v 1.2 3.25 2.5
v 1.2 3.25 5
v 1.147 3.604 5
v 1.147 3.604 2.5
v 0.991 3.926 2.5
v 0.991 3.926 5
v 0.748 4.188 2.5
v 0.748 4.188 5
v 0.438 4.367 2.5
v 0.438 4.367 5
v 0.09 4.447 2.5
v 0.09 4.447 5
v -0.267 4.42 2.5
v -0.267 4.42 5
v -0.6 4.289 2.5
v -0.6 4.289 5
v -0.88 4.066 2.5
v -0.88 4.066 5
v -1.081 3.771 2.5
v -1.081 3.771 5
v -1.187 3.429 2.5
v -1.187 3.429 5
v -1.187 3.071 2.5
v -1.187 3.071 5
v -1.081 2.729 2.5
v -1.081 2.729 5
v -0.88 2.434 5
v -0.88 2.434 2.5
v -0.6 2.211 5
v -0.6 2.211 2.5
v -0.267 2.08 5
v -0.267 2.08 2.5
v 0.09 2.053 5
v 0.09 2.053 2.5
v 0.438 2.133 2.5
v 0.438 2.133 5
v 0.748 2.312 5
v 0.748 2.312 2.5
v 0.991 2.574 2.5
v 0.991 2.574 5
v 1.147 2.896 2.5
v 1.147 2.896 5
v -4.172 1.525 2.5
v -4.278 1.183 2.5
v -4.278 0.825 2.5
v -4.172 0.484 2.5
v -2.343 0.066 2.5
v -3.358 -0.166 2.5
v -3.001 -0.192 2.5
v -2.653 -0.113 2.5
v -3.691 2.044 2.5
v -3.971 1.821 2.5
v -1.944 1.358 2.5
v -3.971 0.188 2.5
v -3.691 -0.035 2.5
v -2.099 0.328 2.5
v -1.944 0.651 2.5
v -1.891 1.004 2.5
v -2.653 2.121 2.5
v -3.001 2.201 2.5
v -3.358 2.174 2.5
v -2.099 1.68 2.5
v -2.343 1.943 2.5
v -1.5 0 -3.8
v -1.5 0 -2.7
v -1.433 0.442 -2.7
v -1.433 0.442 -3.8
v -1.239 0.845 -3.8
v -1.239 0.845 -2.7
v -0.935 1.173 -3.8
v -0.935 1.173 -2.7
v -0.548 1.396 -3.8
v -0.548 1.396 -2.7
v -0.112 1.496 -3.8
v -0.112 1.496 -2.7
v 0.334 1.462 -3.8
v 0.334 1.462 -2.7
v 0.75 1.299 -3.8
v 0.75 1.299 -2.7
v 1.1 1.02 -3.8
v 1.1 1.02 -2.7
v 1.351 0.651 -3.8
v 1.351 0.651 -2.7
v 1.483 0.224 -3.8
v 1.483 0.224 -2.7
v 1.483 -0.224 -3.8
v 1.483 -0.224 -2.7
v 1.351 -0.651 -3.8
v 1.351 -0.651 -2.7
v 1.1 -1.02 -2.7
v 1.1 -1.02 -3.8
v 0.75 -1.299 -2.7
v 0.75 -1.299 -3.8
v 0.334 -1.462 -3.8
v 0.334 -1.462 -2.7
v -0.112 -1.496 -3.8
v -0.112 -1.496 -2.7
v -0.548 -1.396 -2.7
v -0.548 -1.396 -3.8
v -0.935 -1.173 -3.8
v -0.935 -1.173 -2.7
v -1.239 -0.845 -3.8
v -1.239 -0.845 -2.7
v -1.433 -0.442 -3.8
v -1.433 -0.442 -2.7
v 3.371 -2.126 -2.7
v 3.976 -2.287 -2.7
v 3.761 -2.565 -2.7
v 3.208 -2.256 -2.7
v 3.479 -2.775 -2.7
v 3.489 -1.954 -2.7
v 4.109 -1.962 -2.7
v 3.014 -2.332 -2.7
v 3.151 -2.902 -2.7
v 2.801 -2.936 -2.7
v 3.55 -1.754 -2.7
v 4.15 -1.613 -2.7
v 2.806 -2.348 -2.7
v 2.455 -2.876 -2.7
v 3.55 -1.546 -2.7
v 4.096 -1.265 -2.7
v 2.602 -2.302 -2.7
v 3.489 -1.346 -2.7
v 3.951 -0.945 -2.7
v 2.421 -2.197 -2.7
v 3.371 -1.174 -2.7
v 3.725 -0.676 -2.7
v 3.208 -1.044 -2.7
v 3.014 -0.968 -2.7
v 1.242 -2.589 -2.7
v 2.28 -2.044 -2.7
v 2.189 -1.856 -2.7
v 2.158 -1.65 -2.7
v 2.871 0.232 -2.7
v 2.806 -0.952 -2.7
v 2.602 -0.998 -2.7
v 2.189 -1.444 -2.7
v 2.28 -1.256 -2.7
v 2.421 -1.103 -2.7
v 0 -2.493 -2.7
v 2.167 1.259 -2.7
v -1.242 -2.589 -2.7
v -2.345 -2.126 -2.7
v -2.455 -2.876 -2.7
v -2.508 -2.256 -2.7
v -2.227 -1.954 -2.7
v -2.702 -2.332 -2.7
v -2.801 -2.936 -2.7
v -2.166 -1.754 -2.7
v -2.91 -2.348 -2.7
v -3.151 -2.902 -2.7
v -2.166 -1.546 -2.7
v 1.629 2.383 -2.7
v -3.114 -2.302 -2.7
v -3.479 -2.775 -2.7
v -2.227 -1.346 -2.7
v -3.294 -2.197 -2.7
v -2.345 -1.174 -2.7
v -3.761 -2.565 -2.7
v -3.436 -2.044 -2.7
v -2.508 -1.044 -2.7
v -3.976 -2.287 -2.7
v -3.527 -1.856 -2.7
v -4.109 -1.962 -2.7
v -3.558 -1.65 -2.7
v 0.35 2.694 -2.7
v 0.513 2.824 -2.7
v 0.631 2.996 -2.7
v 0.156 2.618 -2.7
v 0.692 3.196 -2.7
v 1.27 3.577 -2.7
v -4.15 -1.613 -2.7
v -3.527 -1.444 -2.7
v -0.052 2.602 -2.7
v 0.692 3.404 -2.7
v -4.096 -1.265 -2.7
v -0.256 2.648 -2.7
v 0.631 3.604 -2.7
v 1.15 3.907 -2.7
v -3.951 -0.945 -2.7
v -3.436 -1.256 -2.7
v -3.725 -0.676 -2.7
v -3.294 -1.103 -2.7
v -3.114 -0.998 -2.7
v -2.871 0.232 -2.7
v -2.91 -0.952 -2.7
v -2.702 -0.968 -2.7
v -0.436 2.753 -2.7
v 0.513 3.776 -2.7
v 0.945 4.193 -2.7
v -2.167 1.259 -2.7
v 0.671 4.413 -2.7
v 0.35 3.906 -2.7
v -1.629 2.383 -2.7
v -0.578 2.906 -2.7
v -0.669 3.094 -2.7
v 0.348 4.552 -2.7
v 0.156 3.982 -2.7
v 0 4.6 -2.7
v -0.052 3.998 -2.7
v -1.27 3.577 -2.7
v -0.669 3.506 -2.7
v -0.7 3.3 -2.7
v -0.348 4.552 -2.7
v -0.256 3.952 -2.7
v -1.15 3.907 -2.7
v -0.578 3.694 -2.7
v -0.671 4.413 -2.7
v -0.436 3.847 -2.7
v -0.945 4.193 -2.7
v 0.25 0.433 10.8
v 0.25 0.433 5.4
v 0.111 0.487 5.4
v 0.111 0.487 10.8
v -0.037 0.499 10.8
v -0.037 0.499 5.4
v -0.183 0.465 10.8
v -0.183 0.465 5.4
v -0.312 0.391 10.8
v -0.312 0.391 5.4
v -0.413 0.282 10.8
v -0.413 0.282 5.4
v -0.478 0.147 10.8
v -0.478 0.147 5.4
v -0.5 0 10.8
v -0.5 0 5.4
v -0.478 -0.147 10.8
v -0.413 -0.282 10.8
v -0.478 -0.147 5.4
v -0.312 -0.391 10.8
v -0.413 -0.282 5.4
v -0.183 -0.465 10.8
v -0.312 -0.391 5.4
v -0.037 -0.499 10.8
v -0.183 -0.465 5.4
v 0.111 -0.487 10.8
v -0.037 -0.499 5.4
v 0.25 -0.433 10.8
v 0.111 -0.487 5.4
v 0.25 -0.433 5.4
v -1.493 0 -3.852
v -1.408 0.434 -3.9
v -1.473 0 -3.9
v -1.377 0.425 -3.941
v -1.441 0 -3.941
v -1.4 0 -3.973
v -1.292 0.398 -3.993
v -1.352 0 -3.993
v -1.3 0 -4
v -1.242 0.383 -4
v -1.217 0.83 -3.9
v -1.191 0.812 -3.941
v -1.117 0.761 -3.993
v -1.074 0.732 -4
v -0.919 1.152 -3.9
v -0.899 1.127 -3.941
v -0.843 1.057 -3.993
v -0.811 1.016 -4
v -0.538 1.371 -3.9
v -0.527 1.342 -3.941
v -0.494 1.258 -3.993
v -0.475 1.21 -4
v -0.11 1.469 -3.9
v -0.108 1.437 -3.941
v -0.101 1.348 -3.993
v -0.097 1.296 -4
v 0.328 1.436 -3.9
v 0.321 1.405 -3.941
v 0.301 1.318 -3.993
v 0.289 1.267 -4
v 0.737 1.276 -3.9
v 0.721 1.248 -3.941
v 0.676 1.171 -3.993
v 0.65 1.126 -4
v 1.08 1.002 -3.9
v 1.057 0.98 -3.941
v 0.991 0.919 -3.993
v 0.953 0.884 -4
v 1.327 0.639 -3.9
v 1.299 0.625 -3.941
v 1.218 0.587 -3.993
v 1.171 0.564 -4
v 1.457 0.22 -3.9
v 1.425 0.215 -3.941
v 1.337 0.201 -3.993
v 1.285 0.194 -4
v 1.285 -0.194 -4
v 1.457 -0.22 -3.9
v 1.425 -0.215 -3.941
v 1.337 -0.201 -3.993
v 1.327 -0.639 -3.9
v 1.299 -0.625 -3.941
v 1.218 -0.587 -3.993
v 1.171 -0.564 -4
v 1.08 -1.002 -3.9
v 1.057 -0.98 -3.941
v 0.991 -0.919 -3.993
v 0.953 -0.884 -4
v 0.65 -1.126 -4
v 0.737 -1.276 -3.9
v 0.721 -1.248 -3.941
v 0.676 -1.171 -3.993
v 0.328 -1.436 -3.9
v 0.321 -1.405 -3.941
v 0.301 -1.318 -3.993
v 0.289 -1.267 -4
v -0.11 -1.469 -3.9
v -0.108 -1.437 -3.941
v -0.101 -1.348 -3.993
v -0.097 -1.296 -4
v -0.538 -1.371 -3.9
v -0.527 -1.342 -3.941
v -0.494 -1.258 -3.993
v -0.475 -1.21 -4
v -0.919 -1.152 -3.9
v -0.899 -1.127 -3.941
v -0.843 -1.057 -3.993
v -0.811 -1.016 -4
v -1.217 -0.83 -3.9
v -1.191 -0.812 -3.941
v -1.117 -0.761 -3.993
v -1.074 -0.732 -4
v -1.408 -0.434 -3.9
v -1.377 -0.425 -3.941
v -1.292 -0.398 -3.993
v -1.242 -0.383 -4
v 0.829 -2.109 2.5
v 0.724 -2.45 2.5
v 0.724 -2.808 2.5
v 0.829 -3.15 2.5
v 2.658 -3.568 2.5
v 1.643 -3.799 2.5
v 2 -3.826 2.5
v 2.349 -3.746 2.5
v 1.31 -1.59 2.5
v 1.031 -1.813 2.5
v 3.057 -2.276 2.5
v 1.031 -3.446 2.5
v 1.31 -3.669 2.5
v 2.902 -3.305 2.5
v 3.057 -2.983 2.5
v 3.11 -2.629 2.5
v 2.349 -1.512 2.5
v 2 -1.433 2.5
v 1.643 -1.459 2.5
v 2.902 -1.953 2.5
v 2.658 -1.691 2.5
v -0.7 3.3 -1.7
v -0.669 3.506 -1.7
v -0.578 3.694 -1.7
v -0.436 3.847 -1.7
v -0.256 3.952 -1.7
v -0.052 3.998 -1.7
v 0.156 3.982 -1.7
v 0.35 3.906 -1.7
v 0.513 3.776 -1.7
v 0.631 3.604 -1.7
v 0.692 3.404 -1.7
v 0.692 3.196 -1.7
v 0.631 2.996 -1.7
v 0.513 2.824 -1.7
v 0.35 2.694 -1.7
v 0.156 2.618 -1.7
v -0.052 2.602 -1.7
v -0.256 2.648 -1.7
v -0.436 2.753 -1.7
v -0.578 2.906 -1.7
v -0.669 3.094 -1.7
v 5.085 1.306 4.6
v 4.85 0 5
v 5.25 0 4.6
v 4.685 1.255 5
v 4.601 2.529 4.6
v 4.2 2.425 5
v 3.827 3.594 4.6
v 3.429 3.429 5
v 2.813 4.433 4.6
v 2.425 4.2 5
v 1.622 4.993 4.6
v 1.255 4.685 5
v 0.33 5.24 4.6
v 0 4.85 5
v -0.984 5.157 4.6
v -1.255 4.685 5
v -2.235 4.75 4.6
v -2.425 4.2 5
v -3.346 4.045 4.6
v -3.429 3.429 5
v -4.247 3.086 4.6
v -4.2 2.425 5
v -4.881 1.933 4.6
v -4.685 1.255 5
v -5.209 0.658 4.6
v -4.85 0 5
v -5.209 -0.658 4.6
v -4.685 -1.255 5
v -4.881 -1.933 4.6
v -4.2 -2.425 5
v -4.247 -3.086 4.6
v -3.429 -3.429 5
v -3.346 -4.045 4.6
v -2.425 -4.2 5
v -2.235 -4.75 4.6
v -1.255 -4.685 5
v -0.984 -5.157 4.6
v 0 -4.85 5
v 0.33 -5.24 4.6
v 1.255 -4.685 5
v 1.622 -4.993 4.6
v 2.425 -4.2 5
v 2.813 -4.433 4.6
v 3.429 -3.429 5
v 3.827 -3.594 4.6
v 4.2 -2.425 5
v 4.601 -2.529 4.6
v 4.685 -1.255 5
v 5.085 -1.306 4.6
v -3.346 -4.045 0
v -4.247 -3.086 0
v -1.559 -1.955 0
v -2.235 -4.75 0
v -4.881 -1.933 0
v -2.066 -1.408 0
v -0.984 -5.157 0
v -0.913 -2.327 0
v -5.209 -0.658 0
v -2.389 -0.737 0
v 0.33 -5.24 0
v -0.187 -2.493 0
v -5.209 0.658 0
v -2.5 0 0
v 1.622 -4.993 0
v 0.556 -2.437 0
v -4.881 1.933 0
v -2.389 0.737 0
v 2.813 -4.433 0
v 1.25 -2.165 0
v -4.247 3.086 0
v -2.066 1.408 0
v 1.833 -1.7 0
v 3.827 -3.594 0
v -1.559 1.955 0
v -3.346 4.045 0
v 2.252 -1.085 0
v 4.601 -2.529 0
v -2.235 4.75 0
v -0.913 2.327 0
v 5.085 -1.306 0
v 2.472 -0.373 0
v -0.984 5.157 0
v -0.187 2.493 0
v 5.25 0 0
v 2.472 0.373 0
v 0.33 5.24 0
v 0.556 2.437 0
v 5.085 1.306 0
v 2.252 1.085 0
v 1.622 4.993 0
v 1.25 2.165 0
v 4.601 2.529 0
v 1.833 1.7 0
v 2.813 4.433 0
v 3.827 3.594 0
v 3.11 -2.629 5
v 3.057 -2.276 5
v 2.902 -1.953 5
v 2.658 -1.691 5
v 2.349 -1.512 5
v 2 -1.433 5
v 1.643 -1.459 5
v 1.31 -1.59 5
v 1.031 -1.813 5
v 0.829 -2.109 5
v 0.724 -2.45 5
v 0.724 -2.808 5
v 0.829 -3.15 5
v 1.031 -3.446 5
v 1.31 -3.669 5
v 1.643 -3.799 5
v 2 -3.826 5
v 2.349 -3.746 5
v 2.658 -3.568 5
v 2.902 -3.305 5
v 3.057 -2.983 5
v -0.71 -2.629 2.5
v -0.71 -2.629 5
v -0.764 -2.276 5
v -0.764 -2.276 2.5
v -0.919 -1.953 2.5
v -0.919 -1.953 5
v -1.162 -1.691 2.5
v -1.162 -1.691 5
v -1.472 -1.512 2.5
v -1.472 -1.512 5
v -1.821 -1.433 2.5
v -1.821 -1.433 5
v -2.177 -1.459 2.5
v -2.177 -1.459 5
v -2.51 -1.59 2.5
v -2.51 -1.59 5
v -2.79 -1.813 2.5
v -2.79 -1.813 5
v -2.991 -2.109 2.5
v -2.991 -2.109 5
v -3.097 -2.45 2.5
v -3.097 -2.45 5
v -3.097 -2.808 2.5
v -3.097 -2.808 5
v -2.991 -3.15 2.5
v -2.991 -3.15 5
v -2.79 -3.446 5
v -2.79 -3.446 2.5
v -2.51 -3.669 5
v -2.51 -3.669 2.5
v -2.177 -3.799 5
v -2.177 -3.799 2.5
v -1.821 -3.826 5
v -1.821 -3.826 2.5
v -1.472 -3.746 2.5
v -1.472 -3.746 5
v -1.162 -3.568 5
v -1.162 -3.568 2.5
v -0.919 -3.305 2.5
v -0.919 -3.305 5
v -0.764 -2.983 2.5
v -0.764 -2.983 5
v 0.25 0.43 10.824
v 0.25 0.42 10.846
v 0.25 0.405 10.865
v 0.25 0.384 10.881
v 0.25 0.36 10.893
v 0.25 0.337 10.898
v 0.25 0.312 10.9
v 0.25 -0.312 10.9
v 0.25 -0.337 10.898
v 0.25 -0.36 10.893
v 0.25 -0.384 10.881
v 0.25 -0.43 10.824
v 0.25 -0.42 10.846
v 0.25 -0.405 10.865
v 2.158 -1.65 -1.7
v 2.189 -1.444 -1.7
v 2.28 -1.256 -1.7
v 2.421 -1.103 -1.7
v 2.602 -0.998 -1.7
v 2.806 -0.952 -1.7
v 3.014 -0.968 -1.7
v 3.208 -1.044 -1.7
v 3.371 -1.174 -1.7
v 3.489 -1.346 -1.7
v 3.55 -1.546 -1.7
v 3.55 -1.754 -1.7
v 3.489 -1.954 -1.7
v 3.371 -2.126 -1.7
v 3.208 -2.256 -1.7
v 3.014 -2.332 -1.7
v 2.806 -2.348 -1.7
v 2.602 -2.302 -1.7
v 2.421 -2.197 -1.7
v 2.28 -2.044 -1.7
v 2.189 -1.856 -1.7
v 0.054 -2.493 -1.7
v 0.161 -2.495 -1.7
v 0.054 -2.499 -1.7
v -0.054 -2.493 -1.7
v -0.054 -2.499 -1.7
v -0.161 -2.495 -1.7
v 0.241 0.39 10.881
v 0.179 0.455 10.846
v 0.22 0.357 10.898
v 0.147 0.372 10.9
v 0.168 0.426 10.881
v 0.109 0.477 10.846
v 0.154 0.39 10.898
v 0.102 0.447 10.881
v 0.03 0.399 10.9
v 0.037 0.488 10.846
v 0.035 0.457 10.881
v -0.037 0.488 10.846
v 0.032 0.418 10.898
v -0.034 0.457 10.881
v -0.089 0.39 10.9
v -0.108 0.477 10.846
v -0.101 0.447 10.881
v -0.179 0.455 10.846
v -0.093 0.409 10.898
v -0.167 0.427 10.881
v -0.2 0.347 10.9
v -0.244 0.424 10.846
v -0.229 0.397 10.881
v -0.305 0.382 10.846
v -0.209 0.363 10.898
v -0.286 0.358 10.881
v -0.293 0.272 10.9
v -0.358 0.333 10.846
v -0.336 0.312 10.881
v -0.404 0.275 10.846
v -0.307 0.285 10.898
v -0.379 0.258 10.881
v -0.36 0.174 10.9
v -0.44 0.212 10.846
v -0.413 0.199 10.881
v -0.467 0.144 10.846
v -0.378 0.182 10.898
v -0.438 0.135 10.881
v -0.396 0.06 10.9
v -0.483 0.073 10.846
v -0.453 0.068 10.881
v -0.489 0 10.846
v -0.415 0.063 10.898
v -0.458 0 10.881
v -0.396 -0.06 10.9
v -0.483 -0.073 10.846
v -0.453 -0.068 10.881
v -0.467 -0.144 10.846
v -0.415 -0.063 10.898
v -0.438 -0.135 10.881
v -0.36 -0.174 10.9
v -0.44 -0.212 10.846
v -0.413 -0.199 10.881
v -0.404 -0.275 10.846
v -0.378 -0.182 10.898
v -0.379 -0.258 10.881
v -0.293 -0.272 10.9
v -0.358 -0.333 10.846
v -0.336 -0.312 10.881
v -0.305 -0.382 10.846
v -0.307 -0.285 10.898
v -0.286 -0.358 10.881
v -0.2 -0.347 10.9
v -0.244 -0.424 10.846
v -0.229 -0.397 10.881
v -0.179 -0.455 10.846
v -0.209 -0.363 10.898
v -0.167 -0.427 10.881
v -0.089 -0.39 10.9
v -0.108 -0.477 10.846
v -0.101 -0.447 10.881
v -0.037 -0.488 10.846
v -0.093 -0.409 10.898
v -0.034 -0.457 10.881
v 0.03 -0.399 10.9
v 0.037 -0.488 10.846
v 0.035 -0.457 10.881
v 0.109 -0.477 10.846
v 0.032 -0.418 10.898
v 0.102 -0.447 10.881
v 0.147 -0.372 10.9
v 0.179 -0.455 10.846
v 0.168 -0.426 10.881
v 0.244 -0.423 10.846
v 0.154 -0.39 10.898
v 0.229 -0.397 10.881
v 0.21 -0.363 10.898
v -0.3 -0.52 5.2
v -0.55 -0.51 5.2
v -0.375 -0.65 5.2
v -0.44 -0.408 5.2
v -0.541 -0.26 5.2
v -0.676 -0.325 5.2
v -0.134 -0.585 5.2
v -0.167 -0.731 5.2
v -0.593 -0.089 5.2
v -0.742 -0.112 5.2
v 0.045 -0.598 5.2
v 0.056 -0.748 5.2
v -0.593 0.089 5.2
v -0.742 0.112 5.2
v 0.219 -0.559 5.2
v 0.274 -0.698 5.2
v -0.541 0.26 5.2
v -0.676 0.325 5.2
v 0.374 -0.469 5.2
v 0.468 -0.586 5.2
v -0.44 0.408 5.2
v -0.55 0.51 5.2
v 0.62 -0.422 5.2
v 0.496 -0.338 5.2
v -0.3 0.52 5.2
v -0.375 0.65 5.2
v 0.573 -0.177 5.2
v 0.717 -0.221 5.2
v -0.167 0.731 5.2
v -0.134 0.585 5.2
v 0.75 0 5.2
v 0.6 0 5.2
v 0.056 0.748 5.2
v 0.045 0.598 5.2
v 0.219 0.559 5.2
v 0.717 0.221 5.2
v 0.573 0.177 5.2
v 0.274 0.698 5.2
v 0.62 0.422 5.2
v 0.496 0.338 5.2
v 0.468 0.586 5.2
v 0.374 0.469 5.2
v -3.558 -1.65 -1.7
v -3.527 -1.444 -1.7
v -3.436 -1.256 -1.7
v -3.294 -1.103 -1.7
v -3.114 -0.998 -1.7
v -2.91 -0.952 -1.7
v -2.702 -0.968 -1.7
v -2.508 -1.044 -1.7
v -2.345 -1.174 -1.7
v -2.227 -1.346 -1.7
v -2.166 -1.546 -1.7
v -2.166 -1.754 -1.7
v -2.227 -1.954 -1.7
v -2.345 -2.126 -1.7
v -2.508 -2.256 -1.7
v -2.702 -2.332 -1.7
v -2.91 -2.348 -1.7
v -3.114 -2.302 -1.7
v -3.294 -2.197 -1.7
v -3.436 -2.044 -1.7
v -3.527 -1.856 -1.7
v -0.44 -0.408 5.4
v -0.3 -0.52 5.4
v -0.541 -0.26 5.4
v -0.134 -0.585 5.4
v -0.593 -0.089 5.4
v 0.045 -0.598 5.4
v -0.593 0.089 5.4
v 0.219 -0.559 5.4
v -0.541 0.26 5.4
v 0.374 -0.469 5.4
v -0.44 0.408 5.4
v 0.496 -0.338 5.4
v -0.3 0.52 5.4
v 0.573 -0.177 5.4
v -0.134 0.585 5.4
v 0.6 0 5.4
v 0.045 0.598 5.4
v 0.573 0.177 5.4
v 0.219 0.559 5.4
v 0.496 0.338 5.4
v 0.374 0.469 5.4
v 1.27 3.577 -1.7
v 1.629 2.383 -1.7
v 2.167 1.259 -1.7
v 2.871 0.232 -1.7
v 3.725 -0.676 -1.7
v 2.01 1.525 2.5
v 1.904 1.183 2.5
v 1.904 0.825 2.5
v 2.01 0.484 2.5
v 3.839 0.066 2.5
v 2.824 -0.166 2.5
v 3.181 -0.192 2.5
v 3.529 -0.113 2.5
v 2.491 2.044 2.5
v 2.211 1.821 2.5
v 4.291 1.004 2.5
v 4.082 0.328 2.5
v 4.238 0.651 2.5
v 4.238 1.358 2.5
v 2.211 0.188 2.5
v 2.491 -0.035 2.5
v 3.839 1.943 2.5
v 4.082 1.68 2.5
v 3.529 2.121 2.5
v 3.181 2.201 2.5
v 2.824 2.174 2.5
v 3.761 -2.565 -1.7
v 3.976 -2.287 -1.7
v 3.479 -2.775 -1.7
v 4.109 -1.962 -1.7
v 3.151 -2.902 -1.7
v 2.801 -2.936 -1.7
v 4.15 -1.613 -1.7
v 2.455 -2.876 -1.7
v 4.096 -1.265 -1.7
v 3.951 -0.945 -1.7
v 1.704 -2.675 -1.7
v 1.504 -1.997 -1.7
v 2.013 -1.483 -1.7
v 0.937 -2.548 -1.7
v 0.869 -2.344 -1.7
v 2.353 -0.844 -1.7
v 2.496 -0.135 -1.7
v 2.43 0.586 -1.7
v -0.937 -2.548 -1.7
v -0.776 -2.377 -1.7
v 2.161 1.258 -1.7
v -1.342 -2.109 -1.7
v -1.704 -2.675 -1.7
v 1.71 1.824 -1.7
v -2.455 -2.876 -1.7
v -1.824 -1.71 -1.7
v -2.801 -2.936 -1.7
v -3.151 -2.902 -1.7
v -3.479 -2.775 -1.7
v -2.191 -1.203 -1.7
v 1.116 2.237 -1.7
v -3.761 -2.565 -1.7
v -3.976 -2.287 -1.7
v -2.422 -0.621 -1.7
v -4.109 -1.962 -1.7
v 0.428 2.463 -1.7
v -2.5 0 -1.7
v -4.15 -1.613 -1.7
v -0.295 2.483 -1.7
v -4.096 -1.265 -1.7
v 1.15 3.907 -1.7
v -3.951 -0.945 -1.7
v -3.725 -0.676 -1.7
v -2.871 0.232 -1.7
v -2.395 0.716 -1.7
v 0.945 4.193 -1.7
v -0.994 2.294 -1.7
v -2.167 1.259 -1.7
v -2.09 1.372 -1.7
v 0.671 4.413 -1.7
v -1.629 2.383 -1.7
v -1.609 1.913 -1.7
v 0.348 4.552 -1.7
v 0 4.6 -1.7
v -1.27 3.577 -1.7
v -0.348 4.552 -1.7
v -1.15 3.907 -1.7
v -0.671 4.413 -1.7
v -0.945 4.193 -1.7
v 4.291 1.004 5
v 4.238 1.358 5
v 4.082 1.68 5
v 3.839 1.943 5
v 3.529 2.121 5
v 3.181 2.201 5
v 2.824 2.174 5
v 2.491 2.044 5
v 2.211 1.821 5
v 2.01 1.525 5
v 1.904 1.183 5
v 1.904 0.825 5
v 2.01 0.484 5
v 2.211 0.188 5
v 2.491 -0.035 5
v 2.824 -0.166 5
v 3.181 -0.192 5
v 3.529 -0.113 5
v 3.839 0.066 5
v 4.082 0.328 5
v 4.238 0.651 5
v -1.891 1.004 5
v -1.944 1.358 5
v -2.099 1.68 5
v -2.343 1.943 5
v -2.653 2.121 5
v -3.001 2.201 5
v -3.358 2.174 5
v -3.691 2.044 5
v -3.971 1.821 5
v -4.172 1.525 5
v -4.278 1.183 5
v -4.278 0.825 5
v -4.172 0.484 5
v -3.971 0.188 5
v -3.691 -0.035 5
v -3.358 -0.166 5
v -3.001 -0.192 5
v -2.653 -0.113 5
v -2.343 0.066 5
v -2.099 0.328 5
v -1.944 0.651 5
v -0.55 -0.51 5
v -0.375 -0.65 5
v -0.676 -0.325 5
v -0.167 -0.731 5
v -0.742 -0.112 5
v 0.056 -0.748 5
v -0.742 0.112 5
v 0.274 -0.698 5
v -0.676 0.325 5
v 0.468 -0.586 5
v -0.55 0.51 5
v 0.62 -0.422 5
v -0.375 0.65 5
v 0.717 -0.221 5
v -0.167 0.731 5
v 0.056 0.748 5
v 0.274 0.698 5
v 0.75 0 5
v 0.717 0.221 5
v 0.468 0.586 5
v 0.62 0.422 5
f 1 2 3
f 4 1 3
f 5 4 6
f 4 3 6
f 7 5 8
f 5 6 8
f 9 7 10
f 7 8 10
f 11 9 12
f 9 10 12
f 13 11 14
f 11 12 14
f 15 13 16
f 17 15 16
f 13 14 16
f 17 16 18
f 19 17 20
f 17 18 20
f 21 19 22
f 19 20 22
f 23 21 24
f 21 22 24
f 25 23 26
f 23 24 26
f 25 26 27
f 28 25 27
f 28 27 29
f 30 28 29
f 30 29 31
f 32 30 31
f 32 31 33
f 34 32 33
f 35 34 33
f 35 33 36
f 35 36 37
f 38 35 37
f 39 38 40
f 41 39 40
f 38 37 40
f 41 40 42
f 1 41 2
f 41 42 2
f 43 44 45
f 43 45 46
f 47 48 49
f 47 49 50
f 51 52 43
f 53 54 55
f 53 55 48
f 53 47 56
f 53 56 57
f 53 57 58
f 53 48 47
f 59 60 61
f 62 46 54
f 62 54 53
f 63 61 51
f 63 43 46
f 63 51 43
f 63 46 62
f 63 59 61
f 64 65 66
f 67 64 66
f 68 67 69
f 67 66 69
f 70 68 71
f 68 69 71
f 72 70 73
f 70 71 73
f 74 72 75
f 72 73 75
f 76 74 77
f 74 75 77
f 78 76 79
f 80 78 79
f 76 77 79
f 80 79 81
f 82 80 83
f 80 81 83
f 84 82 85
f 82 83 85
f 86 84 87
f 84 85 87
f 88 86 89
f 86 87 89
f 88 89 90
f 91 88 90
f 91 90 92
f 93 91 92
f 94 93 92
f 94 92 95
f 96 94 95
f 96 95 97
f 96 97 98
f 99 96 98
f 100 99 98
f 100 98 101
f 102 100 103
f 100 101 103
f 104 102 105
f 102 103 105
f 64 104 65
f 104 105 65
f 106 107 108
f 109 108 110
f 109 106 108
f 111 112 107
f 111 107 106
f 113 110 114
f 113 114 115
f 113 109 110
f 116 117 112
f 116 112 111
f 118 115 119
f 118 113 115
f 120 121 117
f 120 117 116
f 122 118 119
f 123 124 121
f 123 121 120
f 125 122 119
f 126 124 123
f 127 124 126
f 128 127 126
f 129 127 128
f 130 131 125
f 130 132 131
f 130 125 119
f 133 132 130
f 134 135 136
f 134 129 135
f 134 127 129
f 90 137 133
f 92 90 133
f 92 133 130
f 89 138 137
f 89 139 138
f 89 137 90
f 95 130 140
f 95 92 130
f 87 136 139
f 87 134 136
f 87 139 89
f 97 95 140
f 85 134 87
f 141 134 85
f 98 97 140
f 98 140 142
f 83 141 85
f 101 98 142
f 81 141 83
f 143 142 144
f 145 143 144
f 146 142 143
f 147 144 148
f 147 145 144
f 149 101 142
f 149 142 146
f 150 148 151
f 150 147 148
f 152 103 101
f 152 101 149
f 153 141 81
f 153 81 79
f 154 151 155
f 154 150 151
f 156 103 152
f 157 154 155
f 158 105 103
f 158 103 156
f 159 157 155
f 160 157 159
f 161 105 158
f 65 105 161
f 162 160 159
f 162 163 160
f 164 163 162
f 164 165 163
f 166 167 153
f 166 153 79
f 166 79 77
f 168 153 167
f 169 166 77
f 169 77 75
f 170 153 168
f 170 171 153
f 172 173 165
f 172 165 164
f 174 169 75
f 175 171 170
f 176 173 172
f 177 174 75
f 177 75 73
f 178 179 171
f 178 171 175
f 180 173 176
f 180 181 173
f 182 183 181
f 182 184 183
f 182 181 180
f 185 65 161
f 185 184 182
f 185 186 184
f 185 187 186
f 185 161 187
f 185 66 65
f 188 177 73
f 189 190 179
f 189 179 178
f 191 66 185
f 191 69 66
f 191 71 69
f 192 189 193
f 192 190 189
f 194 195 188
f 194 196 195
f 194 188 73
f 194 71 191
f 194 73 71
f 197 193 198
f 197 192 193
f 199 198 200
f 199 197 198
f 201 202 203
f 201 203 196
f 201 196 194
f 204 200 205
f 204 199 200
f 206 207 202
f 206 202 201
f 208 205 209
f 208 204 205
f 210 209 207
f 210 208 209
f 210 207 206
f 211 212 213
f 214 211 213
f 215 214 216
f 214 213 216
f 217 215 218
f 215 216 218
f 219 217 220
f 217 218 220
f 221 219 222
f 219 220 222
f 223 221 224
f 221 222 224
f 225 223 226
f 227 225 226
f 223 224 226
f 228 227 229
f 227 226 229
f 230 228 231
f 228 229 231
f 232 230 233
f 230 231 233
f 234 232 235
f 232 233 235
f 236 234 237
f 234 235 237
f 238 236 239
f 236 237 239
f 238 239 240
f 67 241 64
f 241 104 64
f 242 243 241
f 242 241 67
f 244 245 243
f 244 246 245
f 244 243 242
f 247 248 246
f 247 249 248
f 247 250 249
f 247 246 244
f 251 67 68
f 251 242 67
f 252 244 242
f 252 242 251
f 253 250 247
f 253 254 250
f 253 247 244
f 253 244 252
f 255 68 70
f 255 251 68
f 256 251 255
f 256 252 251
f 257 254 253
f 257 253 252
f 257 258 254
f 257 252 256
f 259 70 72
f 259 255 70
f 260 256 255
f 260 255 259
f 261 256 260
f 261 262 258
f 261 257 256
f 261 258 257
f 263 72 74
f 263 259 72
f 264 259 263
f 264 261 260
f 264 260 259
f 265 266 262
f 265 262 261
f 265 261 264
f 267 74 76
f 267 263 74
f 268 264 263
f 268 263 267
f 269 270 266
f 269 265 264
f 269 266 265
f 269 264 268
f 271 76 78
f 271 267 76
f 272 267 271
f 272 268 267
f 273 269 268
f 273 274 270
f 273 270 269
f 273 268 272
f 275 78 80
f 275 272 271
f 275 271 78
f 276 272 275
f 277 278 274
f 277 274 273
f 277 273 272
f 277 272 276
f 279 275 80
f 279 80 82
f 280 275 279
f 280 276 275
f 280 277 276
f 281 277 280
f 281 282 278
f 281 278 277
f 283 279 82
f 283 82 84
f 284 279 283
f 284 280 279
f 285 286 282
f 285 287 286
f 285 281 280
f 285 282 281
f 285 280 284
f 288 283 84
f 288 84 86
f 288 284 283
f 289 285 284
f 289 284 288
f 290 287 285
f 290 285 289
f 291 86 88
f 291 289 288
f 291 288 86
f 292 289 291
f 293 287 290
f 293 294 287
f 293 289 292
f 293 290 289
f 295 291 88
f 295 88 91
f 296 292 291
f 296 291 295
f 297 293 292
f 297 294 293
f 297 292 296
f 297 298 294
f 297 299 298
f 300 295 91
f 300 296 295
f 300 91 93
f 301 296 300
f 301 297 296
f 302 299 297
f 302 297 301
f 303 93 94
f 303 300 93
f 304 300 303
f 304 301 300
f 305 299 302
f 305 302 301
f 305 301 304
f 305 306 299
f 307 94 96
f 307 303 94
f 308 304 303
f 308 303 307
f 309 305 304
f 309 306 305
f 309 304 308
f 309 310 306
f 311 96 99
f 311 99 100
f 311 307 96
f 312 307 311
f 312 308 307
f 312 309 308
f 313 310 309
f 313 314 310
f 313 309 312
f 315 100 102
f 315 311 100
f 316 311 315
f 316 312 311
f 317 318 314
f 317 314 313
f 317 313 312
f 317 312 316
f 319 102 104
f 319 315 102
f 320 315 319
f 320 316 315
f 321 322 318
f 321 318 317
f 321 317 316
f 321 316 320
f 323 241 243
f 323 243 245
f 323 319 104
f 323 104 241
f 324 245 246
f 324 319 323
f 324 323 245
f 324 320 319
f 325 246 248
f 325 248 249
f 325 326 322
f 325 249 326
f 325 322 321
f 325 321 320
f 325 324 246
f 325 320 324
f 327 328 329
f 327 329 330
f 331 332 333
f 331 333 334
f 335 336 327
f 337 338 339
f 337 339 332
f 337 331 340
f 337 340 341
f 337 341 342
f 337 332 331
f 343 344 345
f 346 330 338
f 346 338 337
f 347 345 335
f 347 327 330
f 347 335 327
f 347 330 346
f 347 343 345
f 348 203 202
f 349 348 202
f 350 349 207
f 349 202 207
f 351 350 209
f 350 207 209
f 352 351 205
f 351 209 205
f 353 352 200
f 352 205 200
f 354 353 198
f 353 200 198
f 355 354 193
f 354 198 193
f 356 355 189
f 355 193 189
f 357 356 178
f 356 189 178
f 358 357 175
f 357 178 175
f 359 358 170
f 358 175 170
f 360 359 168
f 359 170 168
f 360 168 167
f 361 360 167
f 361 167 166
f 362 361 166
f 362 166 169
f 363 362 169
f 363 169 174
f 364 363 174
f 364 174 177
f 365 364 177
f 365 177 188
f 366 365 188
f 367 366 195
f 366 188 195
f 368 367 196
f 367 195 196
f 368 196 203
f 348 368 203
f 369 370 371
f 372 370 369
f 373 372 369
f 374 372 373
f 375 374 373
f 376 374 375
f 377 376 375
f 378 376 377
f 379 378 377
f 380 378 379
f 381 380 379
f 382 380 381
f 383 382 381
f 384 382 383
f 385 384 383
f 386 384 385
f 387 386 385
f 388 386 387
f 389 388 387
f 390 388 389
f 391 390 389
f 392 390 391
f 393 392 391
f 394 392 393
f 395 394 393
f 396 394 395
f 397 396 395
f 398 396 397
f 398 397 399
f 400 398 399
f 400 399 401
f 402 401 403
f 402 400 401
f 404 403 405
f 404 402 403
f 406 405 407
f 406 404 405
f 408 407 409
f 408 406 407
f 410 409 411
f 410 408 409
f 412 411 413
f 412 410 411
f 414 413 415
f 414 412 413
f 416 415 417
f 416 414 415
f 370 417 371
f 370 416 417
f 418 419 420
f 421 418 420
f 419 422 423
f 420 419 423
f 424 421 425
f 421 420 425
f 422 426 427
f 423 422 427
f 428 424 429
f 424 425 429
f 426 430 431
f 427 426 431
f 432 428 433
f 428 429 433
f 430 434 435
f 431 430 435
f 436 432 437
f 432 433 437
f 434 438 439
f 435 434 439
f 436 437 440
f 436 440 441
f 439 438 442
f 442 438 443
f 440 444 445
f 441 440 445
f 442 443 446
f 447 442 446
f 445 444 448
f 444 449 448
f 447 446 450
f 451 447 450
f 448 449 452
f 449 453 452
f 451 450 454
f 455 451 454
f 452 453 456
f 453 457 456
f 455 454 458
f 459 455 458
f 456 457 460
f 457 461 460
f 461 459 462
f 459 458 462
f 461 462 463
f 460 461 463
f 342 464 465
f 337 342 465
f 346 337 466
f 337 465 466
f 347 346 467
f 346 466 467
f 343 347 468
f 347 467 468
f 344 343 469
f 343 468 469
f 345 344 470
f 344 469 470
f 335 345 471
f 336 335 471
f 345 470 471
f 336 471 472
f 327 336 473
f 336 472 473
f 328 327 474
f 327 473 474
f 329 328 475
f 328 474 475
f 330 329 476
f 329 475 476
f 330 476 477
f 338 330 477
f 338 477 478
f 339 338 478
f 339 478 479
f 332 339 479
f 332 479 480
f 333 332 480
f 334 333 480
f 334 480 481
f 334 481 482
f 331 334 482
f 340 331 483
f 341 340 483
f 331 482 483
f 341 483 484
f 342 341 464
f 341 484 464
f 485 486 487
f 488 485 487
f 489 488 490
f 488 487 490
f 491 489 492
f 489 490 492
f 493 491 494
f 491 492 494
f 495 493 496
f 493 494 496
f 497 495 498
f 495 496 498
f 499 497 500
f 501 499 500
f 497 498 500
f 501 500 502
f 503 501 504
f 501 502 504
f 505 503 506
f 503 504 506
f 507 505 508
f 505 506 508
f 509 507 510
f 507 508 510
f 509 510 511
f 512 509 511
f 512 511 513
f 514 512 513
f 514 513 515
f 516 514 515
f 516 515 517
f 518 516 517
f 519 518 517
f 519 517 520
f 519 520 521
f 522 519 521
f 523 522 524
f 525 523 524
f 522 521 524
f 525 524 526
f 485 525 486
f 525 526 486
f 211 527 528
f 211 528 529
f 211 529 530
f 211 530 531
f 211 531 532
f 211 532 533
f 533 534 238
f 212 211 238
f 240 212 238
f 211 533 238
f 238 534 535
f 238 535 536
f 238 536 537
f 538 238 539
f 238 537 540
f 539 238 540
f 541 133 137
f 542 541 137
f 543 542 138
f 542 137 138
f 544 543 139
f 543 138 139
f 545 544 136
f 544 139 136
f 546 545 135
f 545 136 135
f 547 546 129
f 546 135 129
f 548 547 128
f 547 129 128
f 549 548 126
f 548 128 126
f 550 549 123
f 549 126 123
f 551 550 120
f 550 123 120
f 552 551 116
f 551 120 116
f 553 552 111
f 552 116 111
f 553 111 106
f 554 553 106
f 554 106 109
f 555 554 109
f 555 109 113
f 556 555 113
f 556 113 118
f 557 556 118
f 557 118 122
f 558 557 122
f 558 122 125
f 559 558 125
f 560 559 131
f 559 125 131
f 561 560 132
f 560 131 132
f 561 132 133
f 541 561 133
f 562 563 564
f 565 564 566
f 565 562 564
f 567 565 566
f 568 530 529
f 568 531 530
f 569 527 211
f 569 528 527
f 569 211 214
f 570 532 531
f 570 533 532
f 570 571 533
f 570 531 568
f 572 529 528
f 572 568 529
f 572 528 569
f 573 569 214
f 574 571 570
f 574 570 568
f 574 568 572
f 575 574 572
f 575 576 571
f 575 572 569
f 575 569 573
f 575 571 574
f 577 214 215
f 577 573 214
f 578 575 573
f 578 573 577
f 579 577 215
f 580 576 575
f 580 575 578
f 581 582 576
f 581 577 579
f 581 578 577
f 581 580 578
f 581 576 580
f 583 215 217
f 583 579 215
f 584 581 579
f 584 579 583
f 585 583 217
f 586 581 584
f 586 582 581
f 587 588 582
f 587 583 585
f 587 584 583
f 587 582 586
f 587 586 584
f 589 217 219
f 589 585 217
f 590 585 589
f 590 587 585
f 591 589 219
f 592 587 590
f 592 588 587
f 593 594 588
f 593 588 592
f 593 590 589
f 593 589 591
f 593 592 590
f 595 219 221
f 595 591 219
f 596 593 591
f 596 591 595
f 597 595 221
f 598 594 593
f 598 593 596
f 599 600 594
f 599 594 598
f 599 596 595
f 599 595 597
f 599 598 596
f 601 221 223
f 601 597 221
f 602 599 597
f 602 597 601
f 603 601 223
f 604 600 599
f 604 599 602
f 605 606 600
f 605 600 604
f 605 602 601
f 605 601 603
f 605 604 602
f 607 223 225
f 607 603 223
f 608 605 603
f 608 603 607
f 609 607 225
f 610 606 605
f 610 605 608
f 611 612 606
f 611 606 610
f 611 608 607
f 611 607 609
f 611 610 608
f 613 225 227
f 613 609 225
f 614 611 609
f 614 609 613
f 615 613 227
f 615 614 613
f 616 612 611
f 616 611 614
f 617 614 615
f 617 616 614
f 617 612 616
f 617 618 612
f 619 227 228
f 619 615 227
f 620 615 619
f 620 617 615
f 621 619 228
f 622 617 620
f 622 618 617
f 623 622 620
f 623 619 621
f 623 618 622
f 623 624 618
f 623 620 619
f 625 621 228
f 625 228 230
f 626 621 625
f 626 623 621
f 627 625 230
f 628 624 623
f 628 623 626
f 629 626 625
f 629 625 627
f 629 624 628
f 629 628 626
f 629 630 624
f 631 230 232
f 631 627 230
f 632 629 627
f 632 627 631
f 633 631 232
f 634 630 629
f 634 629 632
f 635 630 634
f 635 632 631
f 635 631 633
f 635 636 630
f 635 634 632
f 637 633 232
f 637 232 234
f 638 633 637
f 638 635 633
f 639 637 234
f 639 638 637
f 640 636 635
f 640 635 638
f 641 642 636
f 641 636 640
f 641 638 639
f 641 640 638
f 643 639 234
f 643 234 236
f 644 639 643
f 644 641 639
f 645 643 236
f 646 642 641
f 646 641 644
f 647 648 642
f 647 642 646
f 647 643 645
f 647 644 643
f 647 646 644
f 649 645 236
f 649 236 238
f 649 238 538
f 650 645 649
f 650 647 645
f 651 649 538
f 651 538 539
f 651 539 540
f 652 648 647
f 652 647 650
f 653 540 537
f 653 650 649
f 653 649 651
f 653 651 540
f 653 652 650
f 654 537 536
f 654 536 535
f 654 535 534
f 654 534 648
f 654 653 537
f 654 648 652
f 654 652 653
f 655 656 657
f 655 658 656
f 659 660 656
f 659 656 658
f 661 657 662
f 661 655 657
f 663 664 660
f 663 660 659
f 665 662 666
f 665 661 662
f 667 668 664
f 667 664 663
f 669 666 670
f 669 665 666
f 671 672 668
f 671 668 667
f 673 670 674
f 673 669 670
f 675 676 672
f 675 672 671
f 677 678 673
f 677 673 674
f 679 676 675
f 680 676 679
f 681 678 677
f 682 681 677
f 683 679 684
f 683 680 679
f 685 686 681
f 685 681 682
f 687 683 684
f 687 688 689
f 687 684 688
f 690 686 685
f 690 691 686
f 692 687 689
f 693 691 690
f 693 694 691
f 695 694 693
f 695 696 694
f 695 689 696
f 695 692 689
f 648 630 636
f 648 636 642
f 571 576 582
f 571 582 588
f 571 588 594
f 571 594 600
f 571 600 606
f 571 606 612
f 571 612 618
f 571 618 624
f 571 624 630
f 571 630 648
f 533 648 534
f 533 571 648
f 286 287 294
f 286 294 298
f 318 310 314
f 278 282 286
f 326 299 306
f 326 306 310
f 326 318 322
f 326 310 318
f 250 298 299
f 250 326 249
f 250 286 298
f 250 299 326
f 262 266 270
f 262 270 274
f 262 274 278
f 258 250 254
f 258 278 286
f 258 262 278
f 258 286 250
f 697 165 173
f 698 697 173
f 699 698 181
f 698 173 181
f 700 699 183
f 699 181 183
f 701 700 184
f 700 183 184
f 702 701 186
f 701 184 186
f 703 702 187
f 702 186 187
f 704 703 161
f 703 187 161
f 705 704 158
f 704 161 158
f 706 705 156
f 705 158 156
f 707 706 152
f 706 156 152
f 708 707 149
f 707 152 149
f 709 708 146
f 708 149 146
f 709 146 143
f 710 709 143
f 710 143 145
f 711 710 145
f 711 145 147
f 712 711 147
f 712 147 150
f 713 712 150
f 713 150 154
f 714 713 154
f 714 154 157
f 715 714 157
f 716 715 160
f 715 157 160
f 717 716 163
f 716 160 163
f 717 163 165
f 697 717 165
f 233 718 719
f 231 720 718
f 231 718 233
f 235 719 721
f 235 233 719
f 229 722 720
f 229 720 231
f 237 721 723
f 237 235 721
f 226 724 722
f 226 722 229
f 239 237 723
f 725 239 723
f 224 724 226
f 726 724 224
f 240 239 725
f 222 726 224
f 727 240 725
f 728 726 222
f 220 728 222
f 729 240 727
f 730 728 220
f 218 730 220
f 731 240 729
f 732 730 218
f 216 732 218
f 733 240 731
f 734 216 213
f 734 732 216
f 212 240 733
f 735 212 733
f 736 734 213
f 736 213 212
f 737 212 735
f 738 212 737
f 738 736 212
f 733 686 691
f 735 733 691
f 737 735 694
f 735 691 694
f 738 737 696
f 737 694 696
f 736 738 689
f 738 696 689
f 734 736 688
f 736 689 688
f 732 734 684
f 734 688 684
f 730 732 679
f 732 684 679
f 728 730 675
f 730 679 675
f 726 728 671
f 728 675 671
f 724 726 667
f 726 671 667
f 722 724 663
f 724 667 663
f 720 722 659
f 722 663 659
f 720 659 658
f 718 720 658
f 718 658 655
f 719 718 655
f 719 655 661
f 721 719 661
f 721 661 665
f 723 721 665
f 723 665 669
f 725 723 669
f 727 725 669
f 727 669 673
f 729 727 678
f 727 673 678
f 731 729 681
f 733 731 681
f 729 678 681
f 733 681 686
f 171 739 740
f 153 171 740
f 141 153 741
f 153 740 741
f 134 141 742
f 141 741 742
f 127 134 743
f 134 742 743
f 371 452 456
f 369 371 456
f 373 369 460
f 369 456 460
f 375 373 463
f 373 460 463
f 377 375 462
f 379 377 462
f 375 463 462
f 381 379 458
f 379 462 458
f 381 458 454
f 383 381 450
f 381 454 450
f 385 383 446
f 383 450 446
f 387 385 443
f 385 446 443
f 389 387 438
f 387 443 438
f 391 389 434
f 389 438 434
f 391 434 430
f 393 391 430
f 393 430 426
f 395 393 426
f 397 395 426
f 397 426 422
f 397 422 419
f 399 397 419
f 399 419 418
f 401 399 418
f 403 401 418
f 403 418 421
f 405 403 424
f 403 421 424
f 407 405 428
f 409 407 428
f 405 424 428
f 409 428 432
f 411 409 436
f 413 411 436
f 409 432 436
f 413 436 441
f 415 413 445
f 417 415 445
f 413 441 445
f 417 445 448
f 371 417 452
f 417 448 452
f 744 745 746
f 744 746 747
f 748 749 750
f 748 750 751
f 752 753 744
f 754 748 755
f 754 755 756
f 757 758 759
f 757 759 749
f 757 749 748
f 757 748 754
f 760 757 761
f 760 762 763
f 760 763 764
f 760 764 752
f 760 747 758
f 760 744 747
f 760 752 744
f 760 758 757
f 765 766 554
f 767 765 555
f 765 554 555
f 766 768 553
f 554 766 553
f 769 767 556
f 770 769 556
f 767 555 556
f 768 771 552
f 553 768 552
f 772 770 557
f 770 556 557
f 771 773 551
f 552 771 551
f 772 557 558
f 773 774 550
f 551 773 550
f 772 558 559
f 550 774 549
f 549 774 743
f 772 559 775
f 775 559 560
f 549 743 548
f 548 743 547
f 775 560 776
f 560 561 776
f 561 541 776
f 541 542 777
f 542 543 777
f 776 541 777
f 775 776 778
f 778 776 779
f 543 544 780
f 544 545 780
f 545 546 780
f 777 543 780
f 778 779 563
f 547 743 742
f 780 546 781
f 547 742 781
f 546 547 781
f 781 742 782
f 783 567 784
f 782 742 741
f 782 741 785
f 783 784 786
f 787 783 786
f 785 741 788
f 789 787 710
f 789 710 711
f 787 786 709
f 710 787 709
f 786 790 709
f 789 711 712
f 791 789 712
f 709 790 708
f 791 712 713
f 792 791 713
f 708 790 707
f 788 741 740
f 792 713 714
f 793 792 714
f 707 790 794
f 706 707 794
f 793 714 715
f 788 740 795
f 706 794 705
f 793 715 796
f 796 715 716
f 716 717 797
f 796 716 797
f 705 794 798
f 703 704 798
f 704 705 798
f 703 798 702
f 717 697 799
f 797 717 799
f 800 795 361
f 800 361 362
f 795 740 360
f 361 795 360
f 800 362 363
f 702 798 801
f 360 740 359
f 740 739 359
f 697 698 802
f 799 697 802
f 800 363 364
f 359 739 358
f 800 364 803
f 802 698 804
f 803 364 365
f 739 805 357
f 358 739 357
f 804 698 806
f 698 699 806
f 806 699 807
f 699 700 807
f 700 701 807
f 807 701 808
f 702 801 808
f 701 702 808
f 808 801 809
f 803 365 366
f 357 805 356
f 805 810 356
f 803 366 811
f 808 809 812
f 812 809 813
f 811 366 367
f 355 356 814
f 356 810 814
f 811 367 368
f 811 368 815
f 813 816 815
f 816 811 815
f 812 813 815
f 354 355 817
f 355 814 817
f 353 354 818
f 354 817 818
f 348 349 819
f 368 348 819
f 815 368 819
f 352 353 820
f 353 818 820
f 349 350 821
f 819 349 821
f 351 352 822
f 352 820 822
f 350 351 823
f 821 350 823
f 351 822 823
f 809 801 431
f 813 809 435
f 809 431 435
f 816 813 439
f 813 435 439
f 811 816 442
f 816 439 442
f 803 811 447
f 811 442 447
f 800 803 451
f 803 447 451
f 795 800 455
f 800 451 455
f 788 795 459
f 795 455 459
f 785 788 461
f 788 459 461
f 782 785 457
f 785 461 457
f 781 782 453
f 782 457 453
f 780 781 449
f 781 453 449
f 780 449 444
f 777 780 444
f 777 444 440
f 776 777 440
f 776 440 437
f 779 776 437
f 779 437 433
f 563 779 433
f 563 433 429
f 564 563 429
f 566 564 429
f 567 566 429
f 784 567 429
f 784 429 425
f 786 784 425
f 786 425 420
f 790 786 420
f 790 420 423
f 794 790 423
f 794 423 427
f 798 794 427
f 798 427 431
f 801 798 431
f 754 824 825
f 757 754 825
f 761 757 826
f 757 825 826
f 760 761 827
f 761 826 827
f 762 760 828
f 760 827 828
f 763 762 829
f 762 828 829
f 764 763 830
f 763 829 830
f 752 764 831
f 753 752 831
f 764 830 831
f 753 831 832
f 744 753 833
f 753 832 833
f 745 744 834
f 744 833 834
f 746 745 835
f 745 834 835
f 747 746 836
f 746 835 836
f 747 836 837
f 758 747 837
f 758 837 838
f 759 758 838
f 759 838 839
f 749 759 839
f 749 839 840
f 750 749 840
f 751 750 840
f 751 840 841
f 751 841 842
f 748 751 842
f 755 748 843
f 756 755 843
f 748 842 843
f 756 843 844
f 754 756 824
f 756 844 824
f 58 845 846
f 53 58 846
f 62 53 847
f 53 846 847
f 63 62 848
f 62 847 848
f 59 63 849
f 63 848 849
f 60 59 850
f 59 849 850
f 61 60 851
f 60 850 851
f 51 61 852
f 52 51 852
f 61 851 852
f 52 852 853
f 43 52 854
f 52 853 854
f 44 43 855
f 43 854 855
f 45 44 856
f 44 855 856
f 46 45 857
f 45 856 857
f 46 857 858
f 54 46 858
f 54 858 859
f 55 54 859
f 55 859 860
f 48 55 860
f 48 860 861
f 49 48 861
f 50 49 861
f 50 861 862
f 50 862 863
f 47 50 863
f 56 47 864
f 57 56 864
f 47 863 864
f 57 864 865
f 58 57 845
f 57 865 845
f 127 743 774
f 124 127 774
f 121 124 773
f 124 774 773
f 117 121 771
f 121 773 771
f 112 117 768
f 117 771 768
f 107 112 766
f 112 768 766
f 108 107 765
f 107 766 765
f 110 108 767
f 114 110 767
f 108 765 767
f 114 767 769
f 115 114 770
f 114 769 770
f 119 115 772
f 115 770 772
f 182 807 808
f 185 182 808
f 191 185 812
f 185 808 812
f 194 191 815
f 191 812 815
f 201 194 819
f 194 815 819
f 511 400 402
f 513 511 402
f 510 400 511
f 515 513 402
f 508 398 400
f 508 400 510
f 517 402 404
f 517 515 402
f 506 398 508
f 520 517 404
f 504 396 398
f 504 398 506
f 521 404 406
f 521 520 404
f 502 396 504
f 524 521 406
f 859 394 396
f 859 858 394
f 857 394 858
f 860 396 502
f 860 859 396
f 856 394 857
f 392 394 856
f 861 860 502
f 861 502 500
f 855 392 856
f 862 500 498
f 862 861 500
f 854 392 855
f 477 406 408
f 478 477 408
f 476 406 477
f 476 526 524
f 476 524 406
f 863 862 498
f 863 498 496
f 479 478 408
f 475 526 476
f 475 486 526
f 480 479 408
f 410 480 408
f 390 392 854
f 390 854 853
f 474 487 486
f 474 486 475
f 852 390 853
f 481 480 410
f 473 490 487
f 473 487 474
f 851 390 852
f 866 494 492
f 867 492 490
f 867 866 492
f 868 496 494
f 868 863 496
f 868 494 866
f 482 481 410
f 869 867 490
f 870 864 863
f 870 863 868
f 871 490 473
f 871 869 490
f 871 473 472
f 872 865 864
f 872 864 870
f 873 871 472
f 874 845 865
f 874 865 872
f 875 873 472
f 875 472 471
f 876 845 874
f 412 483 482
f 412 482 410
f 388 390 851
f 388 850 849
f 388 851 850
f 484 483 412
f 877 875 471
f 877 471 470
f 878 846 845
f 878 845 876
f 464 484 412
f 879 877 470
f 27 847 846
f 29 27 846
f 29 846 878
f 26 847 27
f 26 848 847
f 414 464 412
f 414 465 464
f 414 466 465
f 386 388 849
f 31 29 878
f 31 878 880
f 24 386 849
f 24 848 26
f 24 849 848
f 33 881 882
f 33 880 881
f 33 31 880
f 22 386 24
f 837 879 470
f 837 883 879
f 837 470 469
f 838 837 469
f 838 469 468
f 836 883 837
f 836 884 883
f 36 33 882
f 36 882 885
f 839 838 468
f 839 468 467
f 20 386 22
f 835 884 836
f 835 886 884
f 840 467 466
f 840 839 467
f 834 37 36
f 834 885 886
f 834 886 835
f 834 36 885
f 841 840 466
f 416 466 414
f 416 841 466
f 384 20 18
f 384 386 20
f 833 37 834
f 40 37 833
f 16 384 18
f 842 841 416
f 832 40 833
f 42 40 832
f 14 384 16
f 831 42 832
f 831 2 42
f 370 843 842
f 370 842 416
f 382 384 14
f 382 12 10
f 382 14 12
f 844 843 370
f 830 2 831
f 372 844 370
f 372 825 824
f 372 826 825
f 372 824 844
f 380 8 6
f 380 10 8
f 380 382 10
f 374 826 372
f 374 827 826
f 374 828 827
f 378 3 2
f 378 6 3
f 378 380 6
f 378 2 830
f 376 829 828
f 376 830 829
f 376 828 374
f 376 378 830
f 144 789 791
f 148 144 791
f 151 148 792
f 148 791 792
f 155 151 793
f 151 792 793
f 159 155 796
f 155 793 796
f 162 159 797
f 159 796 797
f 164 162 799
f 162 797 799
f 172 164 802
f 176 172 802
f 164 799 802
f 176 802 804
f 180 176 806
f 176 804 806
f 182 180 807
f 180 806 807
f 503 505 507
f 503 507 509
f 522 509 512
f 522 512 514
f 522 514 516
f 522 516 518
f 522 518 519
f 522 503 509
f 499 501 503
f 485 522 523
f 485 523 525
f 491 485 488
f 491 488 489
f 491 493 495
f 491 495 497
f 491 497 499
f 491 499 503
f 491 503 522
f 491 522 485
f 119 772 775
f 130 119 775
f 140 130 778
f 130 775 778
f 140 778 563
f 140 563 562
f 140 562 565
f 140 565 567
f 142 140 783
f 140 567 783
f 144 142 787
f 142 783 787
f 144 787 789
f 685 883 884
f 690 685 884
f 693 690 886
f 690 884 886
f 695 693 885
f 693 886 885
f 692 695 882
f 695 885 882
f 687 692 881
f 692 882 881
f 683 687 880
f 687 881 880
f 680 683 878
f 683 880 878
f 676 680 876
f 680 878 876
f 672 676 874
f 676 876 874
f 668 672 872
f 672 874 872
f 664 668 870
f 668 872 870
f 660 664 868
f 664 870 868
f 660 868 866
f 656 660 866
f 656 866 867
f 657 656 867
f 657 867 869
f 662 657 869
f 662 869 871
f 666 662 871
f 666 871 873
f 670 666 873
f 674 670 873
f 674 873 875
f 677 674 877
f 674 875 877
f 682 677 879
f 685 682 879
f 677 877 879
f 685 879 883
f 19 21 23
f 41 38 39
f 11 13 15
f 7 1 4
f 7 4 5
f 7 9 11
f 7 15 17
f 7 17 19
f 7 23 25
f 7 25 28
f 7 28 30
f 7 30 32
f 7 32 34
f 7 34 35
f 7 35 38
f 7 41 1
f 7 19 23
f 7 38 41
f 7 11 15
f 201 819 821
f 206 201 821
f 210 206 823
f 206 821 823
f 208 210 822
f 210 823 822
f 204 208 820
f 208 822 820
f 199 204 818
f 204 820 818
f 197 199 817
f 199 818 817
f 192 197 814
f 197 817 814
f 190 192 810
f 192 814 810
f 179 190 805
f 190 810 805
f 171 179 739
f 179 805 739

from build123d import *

# Parameters (mm, degrees)
SKETCH_1_R          = 5.25
EXTRUDE_1_DEPTH     = 5
CHAMFER_1_SIZE      = 0.4
SKETCH_2_R          = 1.2
CUT_EXTRUDE_1_DEPTH = 2.5
SKETCH_3_R          = 0.75
EXTRUDE_2_DEPTH     = 0.2
SKETCH_4_R          = 0.6
EXTRUDE_3_DEPTH     = 0.2
SKETCH_5_R          = 0.5
EXTRUDE_4_DEPTH     = 5.5
FILLET_1_R          = 0.1
SKETCH_6_R          = 2.5
EXTRUDE_5_DEPTH     = 1.7
EXTRUDE_6_DEPTH     = 1
SKETCH_8_R          = 0.7
CUT_EXTRUDE_2_DEPTH = 1
SKETCH_9_R          = 1.5
EXTRUDE_7_DEPTH     = 1.3
FILLET_2_R          = 0.2
CUT_EXTRUDE_3_DEPTH = 5.5


with BuildPart() as part:
    # 草图1 → 凸台-拉伸1 (new body)
    with BuildSketch(Plane.XY):
        Circle(SKETCH_1_R)
    extrude(amount=EXTRUDE_1_DEPTH)

    # 倒角1
    chamfer_1_edges = [part.edges().sort_by_distance(p)[0] for p in [
        (-5.25, 0, 5),
    ]]
    chamfer(chamfer_1_edges, length=CHAMFER_1_SIZE)

    # 草图2 → 切除-拉伸1 (cut)
    with BuildSketch(Plane.XY.offset(5)):
        with Locations((0, 3.25)):
            Circle(SKETCH_2_R)
        with Locations((3.090933678, 1.004305232)):
            Circle(SKETCH_2_R)
        with Locations((1.91030207, -2.629305232)):
            Circle(SKETCH_2_R)
        with Locations((-1.91030207, -2.629305232)):
            Circle(SKETCH_2_R)
        with Locations((-3.090933678, 1.004305232)):
            Circle(SKETCH_2_R)
    extrude(amount=-CUT_EXTRUDE_1_DEPTH, mode=Mode.SUBTRACT)

    # 草图3 → 凸台-拉伸2 (add)
    with BuildSketch(Plane.XY.offset(5)):
        Circle(SKETCH_3_R)
    extrude(amount=EXTRUDE_2_DEPTH)

    # 草图4 → 凸台-拉伸3 (add)
    with BuildSketch(Plane.XY.offset(5.2)):
        Circle(SKETCH_4_R)
    extrude(amount=EXTRUDE_3_DEPTH)

    # 草图5 → 凸台-拉伸4 (add)
    with BuildSketch(Plane.XY.offset(5.4)):
        Circle(SKETCH_5_R)
    extrude(amount=EXTRUDE_4_DEPTH)

    # 圆角1
    fillet_1_edges = [part.edges().sort_by_distance(p)[0] for p in [
        (-0.5, 0, 10.9),
    ]]
    fillet(fillet_1_edges, radius=FILLET_1_R)

    # 草图6 → 凸台-拉伸5 (add)
    with BuildSketch(Plane(origin=(0, 0, 0), x_dir=(-1, 0, 0), z_dir=(0, 0, -1))):
        Circle(SKETCH_6_R)
    extrude(amount=EXTRUDE_5_DEPTH)

    # 草图7 → 凸台-拉伸6 (add)
    with BuildSketch(Plane(origin=(0, 0, -1.7), x_dir=(-1, 0, 0), z_dir=(0, 0, -1))):
        with BuildLine():
            ThreePointArc((1.270195148, 3.576774791), (0, 4.6), (-1.270195148, 3.576774791))
            ThreePointArc((-1.270195148, 3.576774791), (-2.166553875, 1.259382495), (-3.725295111, -0.675583082))
            ThreePointArc((-3.725295111, -0.675583082), (-3.976336561, -2.287216952), (-2.455099963, -2.875625614))
            ThreePointArc((-2.455099963, -2.875625614), (0, -2.493198894), (2.455099963, -2.875625614))
            ThreePointArc((2.455099963, -2.875625614), (3.976336561, -2.287216952), (3.725295111, -0.675583082))
            ThreePointArc((3.725295111, -0.675583082), (2.166553875, 1.259382495), (1.270195148, 3.576774791))
        make_face()
    extrude(amount=EXTRUDE_6_DEPTH)

    # 草图8 → 切除-拉伸2 (cut)
    with BuildSketch(Plane(origin=(0, 0, -2.7), x_dir=(-1, 0, 0), z_dir=(0, 0, -1))):
        with Locations((0, 3.3)):
            Circle(SKETCH_8_R)
        with Locations((2.857883832, -1.65)):
            Circle(SKETCH_8_R)
        with Locations((-2.857883832, -1.65)):
            Circle(SKETCH_8_R)
    extrude(amount=-CUT_EXTRUDE_2_DEPTH, mode=Mode.SUBTRACT)

    # 草图9 → 凸台-拉伸7 (add)
    with BuildSketch(Plane(origin=(0, 0, -2.7), x_dir=(-1, 0, 0), z_dir=(0, 0, -1))):
        Circle(SKETCH_9_R)
    extrude(amount=EXTRUDE_7_DEPTH)

    # 圆角2
    fillet_2_edges = [part.edges().sort_by_distance(p)[0] for p in [
        (1.5, 0, -4),
    ]]
    fillet(fillet_2_edges, radius=FILLET_2_R)

    # 草图10 → 切除-拉伸3 (cut)
    with BuildSketch(Plane.XY.offset(10.9)):
        with BuildLine():
            Line((0.25, 0.441561144), (0.25, -0.441561144))
            ThreePointArc((0.25, -0.441561144), (0.50742117, 0), (0.25, 0.441561144))
        make_face()
    extrude(amount=-CUT_EXTRUDE_3_DEPTH, mode=Mode.SUBTRACT)


solid = part.part
